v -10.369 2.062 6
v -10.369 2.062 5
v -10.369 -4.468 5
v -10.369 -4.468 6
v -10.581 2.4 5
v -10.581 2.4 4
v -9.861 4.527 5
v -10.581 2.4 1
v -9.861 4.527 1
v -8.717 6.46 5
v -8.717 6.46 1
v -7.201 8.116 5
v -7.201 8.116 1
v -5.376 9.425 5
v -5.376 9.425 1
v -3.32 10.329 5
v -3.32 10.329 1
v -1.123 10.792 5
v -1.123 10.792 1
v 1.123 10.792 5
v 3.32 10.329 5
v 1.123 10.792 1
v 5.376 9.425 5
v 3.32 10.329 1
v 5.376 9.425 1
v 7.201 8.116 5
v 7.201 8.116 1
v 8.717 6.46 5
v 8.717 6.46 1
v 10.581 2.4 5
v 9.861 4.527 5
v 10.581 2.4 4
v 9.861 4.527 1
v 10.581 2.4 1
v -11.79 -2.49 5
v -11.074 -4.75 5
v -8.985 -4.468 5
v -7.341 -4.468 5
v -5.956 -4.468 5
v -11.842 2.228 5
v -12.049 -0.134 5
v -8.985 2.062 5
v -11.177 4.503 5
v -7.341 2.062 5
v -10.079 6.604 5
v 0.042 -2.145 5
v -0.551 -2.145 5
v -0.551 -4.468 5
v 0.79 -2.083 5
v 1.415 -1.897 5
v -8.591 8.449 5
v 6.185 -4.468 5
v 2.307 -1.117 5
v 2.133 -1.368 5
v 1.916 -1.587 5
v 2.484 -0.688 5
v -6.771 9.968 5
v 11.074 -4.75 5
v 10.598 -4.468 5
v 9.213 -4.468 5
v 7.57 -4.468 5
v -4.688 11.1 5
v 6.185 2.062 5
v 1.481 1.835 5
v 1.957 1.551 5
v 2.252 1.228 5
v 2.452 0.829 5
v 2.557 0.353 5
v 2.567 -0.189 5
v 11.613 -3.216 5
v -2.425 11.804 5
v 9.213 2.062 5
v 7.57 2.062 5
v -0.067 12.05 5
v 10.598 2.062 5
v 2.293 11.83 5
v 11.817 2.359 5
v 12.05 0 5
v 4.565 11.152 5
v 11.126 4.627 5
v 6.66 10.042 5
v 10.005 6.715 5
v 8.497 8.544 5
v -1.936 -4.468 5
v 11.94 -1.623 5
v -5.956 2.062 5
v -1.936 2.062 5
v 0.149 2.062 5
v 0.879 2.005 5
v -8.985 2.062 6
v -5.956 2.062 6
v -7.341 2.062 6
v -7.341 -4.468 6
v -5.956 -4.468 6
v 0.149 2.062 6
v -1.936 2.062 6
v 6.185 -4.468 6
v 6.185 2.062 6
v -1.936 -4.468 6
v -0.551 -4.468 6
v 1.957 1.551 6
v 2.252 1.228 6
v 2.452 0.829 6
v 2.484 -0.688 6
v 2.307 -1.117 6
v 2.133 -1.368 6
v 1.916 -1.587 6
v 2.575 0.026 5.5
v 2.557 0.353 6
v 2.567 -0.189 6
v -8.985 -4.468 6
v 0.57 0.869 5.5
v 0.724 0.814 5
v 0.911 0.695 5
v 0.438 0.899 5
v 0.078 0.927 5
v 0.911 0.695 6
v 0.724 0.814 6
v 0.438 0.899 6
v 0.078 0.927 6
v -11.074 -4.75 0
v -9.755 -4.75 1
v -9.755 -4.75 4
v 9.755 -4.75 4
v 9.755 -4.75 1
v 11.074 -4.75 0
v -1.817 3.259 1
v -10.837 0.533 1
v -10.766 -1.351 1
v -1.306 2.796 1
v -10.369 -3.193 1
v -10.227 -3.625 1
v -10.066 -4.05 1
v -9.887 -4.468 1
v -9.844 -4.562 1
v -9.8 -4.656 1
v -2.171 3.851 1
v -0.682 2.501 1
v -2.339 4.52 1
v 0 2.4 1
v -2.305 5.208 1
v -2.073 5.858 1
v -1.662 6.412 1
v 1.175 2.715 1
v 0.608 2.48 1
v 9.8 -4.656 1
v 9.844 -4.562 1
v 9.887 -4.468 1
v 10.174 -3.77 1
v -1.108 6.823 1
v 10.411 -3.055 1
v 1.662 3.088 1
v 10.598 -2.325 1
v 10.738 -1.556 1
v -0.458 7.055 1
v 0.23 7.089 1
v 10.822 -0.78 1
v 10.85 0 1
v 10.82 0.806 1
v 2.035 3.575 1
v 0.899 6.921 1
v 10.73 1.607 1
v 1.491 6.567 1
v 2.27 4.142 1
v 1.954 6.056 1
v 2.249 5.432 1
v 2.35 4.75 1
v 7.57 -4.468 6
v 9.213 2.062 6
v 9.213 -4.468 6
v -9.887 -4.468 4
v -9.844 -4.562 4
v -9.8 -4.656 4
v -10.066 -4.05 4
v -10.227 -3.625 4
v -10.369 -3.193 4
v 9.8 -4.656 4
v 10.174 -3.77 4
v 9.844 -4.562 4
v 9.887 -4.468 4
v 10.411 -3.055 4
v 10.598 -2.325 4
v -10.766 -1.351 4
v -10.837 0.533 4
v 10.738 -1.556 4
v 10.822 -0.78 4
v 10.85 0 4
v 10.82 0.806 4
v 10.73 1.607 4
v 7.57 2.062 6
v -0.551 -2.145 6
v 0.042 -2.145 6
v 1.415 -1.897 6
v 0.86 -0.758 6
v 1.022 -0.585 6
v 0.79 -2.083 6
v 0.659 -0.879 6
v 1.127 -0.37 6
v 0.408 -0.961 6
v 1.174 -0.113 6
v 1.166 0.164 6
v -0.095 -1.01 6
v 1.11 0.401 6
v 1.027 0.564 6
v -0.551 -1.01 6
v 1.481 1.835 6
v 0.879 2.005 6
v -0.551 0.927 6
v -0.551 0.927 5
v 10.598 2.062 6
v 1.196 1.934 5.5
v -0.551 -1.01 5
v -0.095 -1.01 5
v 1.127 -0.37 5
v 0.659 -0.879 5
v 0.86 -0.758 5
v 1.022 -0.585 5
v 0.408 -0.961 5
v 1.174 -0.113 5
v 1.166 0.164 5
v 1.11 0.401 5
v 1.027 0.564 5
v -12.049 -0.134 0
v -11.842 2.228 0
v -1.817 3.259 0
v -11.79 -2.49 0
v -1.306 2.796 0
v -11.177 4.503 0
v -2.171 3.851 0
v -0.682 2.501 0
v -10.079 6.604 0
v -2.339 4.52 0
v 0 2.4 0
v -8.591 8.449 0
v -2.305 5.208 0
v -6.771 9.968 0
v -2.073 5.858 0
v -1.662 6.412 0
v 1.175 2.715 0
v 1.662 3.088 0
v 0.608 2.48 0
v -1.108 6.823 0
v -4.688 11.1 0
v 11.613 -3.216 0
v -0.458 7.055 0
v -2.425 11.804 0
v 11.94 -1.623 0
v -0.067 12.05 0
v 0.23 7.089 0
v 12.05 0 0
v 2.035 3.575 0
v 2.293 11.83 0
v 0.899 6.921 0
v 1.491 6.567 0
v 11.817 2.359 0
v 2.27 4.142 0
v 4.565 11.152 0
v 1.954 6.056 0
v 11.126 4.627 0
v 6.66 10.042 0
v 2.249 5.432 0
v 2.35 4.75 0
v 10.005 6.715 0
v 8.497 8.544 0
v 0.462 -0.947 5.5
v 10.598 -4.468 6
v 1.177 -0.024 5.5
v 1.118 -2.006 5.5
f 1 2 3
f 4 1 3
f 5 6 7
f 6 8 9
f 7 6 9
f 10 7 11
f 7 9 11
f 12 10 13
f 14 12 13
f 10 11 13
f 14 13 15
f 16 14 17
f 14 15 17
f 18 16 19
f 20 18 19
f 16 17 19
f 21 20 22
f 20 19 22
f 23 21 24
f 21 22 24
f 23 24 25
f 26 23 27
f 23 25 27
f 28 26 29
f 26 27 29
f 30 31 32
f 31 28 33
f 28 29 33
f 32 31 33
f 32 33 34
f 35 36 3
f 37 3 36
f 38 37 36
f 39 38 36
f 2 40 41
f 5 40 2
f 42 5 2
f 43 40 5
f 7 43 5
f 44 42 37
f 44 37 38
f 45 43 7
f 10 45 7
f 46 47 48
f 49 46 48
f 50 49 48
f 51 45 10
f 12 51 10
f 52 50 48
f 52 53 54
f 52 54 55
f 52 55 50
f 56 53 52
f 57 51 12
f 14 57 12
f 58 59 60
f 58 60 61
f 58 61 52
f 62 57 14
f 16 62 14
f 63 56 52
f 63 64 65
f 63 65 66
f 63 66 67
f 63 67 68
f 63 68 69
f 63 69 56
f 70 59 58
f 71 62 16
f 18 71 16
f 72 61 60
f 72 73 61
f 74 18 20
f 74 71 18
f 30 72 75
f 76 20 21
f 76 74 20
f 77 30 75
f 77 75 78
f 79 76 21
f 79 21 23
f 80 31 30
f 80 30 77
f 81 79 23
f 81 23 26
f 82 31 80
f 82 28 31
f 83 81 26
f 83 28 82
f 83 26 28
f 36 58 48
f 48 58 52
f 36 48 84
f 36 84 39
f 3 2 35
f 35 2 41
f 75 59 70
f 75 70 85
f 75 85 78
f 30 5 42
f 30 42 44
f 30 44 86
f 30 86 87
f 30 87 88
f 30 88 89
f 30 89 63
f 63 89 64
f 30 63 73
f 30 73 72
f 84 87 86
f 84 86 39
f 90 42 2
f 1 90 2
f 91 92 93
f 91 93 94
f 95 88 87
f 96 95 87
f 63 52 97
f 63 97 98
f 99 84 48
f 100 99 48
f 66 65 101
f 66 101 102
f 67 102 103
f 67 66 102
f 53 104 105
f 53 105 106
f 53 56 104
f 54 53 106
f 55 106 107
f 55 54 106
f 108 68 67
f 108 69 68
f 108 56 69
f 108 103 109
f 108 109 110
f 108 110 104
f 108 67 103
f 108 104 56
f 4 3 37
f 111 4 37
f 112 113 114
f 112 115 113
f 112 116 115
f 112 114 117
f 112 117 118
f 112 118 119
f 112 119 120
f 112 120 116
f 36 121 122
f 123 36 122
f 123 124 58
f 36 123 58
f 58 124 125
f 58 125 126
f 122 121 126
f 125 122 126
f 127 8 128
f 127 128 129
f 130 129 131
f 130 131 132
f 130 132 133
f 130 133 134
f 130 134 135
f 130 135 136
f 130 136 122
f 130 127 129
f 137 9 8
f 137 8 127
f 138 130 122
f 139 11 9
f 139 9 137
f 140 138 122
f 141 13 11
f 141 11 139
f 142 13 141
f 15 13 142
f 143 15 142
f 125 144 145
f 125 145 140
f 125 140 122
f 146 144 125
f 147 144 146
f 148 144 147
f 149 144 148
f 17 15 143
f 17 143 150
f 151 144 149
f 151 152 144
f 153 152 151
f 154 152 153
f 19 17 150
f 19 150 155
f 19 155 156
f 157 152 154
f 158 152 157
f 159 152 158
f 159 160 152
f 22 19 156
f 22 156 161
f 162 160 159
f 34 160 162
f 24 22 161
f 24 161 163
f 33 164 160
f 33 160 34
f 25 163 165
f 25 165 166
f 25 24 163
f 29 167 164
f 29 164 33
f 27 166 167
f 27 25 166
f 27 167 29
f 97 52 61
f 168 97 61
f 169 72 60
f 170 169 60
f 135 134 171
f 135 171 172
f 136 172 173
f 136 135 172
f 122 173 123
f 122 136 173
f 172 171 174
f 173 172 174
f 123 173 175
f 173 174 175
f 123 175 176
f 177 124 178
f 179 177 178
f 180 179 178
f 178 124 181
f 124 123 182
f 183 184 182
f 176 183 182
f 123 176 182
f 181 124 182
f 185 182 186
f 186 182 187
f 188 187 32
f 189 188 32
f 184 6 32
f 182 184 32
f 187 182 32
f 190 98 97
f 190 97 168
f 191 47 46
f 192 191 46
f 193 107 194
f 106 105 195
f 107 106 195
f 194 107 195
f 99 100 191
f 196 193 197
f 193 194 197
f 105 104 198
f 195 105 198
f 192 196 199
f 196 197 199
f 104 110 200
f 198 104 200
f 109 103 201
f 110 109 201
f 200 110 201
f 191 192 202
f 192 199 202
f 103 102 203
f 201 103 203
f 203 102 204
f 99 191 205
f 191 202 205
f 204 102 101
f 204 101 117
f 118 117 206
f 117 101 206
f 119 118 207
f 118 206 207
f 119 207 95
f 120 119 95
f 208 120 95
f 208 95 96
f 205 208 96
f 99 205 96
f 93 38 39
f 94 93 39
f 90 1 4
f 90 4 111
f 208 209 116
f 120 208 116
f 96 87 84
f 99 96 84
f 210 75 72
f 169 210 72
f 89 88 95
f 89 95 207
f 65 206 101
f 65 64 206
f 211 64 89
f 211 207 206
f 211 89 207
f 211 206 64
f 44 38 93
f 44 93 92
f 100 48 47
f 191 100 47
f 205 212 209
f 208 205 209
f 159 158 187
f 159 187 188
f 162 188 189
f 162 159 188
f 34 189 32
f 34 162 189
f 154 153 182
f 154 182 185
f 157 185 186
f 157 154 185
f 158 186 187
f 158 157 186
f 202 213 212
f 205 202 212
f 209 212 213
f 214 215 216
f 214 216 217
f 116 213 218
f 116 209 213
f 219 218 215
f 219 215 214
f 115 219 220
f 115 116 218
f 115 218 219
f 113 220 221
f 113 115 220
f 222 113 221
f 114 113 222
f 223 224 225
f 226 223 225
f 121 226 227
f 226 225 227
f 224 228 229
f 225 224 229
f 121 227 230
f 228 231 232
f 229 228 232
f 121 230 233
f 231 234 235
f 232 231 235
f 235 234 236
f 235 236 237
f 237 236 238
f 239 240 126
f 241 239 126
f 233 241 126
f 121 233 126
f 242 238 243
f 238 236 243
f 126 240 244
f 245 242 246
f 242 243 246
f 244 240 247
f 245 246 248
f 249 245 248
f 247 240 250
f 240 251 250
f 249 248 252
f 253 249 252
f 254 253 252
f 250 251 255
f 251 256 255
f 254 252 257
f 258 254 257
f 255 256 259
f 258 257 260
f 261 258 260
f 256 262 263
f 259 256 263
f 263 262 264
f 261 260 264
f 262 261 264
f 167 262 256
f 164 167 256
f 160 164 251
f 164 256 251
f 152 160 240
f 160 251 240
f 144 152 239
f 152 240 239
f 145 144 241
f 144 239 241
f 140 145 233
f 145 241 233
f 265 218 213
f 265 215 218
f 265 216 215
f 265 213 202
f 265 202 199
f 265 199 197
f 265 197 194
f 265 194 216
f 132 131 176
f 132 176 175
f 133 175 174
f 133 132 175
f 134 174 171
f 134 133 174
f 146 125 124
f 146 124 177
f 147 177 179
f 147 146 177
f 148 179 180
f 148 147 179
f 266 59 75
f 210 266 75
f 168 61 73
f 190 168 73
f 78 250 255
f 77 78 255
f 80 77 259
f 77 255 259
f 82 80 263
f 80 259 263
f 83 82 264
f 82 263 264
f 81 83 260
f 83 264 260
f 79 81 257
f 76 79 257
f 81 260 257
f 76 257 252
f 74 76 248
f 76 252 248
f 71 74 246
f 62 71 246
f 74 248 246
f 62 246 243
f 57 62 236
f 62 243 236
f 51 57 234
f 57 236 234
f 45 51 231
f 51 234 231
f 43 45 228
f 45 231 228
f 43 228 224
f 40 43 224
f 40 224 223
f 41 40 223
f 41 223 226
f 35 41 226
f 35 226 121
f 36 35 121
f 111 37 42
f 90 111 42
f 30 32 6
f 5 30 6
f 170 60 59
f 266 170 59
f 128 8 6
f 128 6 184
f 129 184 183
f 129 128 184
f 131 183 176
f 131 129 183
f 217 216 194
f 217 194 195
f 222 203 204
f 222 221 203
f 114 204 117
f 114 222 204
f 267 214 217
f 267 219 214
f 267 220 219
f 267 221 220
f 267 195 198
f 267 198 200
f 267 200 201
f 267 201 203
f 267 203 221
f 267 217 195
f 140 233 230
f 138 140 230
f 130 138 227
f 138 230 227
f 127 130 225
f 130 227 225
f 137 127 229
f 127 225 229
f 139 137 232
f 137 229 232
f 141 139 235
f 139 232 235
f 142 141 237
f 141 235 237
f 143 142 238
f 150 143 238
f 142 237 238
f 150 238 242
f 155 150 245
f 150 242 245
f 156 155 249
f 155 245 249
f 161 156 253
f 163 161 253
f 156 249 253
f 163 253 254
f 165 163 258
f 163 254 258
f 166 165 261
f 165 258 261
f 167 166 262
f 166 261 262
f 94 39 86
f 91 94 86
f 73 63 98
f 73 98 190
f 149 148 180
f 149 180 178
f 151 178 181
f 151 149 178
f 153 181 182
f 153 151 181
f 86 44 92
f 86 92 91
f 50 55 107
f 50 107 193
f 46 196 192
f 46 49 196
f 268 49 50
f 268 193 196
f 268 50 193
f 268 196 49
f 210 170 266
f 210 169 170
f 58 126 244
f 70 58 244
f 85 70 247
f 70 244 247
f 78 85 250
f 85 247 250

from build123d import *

# Parameters (mm, degrees)
F0_W     = 1.3848739799
F0_H     = 6.5299166297
F1_DEPTH = 5
F2_DEPTH = 6
F3_DEPTH = 4
F4_DEPTH = 1


# Not quite as in the source:
# - a feature names something its author has since deleted; it is built from what else it names


with BuildPart() as f1:
    # F0 (on Top) → F1 (new body)
    with BuildSketch(Plane.XY):
        with BuildLine():
            ThreePointArc((-9.8874952566, -4.4676545918), (-9.8222615585, -4.6093034047), (-9.7549987186, -4.75))
            Line((-9.7549987186, -4.75), (9.7549987186, -4.75))
            ThreePointArc((9.7549987186, -4.75), (9.8222615585, -4.6093034047), (9.8874952566, -4.4676545918))
            Line((9.8874952566, -4.4676545918), (9.2131992894, -4.4676545918))
            Line((9.2131992894, -4.4676545918), (9.2131992894, 2.062262038))
            Line((9.2131992894, 2.062262038), (10.5980732693, 2.062262038))
            Line((10.5980732693, 2.062262038), (10.5980732693, -2.3245091907))
            ThreePointArc((10.5980732693, -2.3245091907), (10.7868344516, -1.1690605262), (10.85, 0))
            ThreePointArc((10.85, 0), (10.7825989969, 1.2075010861), (10.5812333875, 2.4))
            Line((10.5812333875, 2.4), (0, 2.4))
            Line((0, 2.4), (-10.5812333875, 2.4))
            ThreePointArc((-10.5812333875, 2.4), (-10.8422277422, -0.4106063639), (-10.3694047071, -3.1934223053))
            Line((-10.3694047071, -3.1934223053), (-10.3694047071, 2.062262038))
            Line((-10.3694047071, 2.062262038), (-8.9845307272, 2.062262038))
            Line((-8.9845307272, 2.062262038), (-8.9845307272, -4.4676545918))
            Line((-8.9845307272, -4.4676545918), (-9.8874952566, -4.4676545918))
        make_face()
        with Locations((-6.6485384464, -1.2026962769)):
            Rectangle(F0_W, F0_H, mode=Mode.SUBTRACT)
        with BuildLine():
            add(Edge.make_bspline(
                [(1.9565453854, 1.55061613), (2.5746650927, 1.0389702221), (2.5746650927, 0.0256826557)],
                knots=[0, 0, 0, 1, 1, 1], degree=2))
            add(Edge.make_bspline(
                [(2.5746650927, 0.0256826557), (2.5746650927, -1.0290510875), (1.9158137978, -1.5871452971)],
                knots=[0, 0, 0, 1, 1, 1], degree=2))
            add(Edge.make_bspline(
                [(1.9158137978, -1.5871452971), (1.2569625029, -2.1452395068), (0.0421607662, -2.1452395068)],
                knots=[0, 0, 0, 1, 1, 1], degree=2))
            Line((0.0421607662, -2.1452395068), (-0.5509483171, -2.1452395068))
            Line((-0.5509483171, -2.1452395068), (-0.5509483171, -4.4676545918))
            Line((-0.5509483171, -4.4676545918), (-1.935822297, -4.4676545918))
            Line((-1.935822297, -4.4676545918), (-1.935822297, 2.062262038))
            Line((-1.935822297, 2.062262038), (0.1493491547, 2.062262038))
            add(Edge.make_bspline(
                [(0.1493491547, 2.062262038), (1.3384256782, 2.062262038), (1.9565453854, 1.55061613)],
                knots=[0, 0, 0, 1, 1, 1], degree=2))
        make_face(mode=Mode.SUBTRACT)
        with Locations((6.8772070086, -1.2026962769)):
            Rectangle(F0_W, F0_H, mode=Mode.SUBTRACT)
        with BuildLine():
            ThreePointArc((11.0742945599, -4.75), (11.8035534787, -2.4245876508), (12.05, 0))
            ThreePointArc((12.05, 0), (-2.4245876508, 11.8035534787), (-11.0742945599, -4.75))
            Line((-11.0742945599, -4.75), (-9.7549987186, -4.75))
            ThreePointArc((-9.7549987186, -4.75), (-9.8222615585, -4.6093034047), (-9.8874952566, -4.4676545918))
            Line((-9.8874952566, -4.4676545918), (-10.3694047071, -4.4676545918))
            Line((-10.3694047071, -4.4676545918), (-10.3694047071, -3.1934223053))
            ThreePointArc((-10.3694047071, -3.1934223053), (-10.8422277422, -0.4106063639), (-10.5812333875, 2.4))
            ThreePointArc((-10.5812333875, 2.4), (0, 10.85), (10.5812333875, 2.4))
            ThreePointArc((10.5812333875, 2.4), (10.7825989969, 1.2075010861), (10.85, 0))
            ThreePointArc((10.85, 0), (10.7868344516, -1.1690605262), (10.5980732693, -2.3245091907))
            Line((10.5980732693, -2.3245091907), (10.5980732693, -4.4676545918))
            Line((10.5980732693, -4.4676545918), (9.8874952566, -4.4676545918))
            ThreePointArc((9.8874952566, -4.4676545918), (9.8222615585, -4.6093034047), (9.7549987186, -4.75))
            Line((9.7549987186, -4.75), (11.0742945599, -4.75))
        make_face()
        with BuildLine():
            Line((-0.5509483171, 0.927494298), (-0.5509483171, -1.0104717668))
            Line((-0.5509483171, -1.0104717668), (-0.0950403712, -1.0104717668))
            add(Edge.make_bspline(
                [(-0.0950403712, -1.0104717668), (0.542373246, -1.0104717668), (0.8596508761, -0.7582217591)],
                knots=[0, 0, 0, 1, 1, 1], degree=2))
            add(Edge.make_bspline(
                [(0.8596508761, -0.7582217591), (1.1769285061, -0.5059717514), (1.1769285061, -0.0243385922)],
                knots=[0, 0, 0, 1, 1, 1], degree=2))
            add(Edge.make_bspline(
                [(1.1769285061, -0.0243385922), (1.1769285061, 0.463011281), (0.9111013026, 0.6952527895)],
                knots=[0, 0, 0, 1, 1, 1], degree=2))
            add(Edge.make_bspline(
                [(0.9111013026, 0.6952527895), (0.645274099, 0.927494298), (0.077890229, 0.927494298)],
                knots=[0, 0, 0, 1, 1, 1], degree=2))
            Line((0.077890229, 0.927494298), (-0.5509483171, 0.927494298))
        make_face()
    extrude(amount=F1_DEPTH)

    # F0 (on Top) → F2 (join)
    with BuildSketch(Plane.XY):
        with BuildLine():
            ThreePointArc((-10.3694047071, -3.1934223053), (-10.1484686537, -3.8381094285), (-9.8874952566, -4.4676545918))
            Line((-9.8874952566, -4.4676545918), (-8.9845307272, -4.4676545918))
            Line((-8.9845307272, -4.4676545918), (-8.9845307272, 2.062262038))
            Line((-8.9845307272, 2.062262038), (-10.3694047071, 2.062262038))
            Line((-10.3694047071, 2.062262038), (-10.3694047071, -3.1934223053))
        make_face()
        with BuildLine():
            Line((-10.3694047071, -4.4676545918), (-9.8874952566, -4.4676545918))
            ThreePointArc((-9.8874952566, -4.4676545918), (-10.1484686537, -3.8381094285), (-10.3694047071, -3.1934223053))
            Line((-10.3694047071, -3.1934223053), (-10.3694047071, -4.4676545918))
        make_face()
        with Locations((-6.6485384464, -1.2026962769)):
            Rectangle(F0_W, F0_H)
        with BuildLine():
            add(Edge.make_bspline(
                [(2.5746650927, 0.0256826557), (2.5746650927, -1.0290510875), (1.9158137978, -1.5871452971)],
                knots=[0, 0, 0, 1, 1, 1], degree=2))
            add(Edge.make_bspline(
                [(1.9565453854, 1.55061613), (2.5746650927, 1.0389702221), (2.5746650927, 0.0256826557)],
                knots=[0, 0, 0, 1, 1, 1], degree=2))
            add(Edge.make_bspline(
                [(0.1493491547, 2.062262038), (1.3384256782, 2.062262038), (1.9565453854, 1.55061613)],
                knots=[0, 0, 0, 1, 1, 1], degree=2))
            Line((0.1493491547, 2.062262038), (-1.935822297, 2.062262038))
            Line((-1.935822297, 2.062262038), (-1.935822297, -4.4676545918))
            Line((-1.935822297, -4.4676545918), (-0.5509483171, -4.4676545918))
            Line((-0.5509483171, -4.4676545918), (-0.5509483171, -2.1452395068))
            Line((-0.5509483171, -2.1452395068), (0.0421607662, -2.1452395068))
            add(Edge.make_bspline(
                [(1.9158137978, -1.5871452971), (1.2569625029, -2.1452395068), (0.0421607662, -2.1452395068)],
                knots=[0, 0, 0, 1, 1, 1], degree=2))
        make_face()
        with BuildLine():
            Line((-0.0950403712, -1.0104717668), (-0.5509483171, -1.0104717668))
            Line((-0.5509483171, -1.0104717668), (-0.5509483171, 0.927494298))
            Line((-0.5509483171, 0.927494298), (0.077890229, 0.927494298))
            add(Edge.make_bspline(
                [(0.9111013026, 0.6952527895), (0.645274099, 0.927494298), (0.077890229, 0.927494298)],
                knots=[0, 0, 0, 1, 1, 1], degree=2))
            add(Edge.make_bspline(
                [(1.1769285061, -0.0243385922), (1.1769285061, 0.463011281), (0.9111013026, 0.6952527895)],
                knots=[0, 0, 0, 1, 1, 1], degree=2))
            add(Edge.make_bspline(
                [(0.8596508761, -0.7582217591), (1.1769285061, -0.5059717514), (1.1769285061, -0.0243385922)],
                knots=[0, 0, 0, 1, 1, 1], degree=2))
            add(Edge.make_bspline(
                [(-0.0950403712, -1.0104717668), (0.542373246, -1.0104717668), (0.8596508761, -0.7582217591)],
                knots=[0, 0, 0, 1, 1, 1], degree=2))
        make_face(mode=Mode.SUBTRACT)
        with Locations((6.8772070086, -1.2026962769)):
            Rectangle(F0_W, F0_H)
        with BuildLine():
            Line((9.2131992894, -4.4676545918), (9.8874952566, -4.4676545918))
            ThreePointArc((9.8874952566, -4.4676545918), (10.2986842611, -3.4146160092), (10.5980732693, -2.3245091907))
            Line((10.5980732693, -2.3245091907), (10.5980732693, 2.062262038))
            Line((10.5980732693, 2.062262038), (9.2131992894, 2.062262038))
            Line((9.2131992894, 2.062262038), (9.2131992894, -4.4676545918))
        make_face()
        with BuildLine():
            ThreePointArc((10.5980732693, -2.3245091907), (10.2986842611, -3.4146160092), (9.8874952566, -4.4676545918))
            Line((9.8874952566, -4.4676545918), (10.5980732693, -4.4676545918))
            Line((10.5980732693, -4.4676545918), (10.5980732693, -2.3245091907))
        make_face()
    extrude(amount=F2_DEPTH)

    # F0 (on Top) → F3 (cut)
    with BuildSketch(Plane.XY):
        with BuildLine():
            ThreePointArc((-9.8874952566, -4.4676545918), (-9.8222615585, -4.6093034047), (-9.7549987186, -4.75))
            Line((-9.7549987186, -4.75), (9.7549987186, -4.75))
            ThreePointArc((9.7549987186, -4.75), (9.8222615585, -4.6093034047), (9.8874952566, -4.4676545918))
            Line((9.8874952566, -4.4676545918), (9.2131992894, -4.4676545918))
            Line((9.2131992894, -4.4676545918), (9.2131992894, 2.062262038))
            Line((9.2131992894, 2.062262038), (10.5980732693, 2.062262038))
            Line((10.5980732693, 2.062262038), (10.5980732693, -2.3245091907))
            ThreePointArc((10.5980732693, -2.3245091907), (10.7868344516, -1.1690605262), (10.85, 0))
            ThreePointArc((10.85, 0), (10.7825989969, 1.2075010861), (10.5812333875, 2.4))
            Line((10.5812333875, 2.4), (0, 2.4))
            Line((0, 2.4), (-10.5812333875, 2.4))
            ThreePointArc((-10.5812333875, 2.4), (-10.8422277422, -0.4106063639), (-10.3694047071, -3.1934223053))
            Line((-10.3694047071, -3.1934223053), (-10.3694047071, 2.062262038))
            Line((-10.3694047071, 2.062262038), (-8.9845307272, 2.062262038))
            Line((-8.9845307272, 2.062262038), (-8.9845307272, -4.4676545918))
            Line((-8.9845307272, -4.4676545918), (-9.8874952566, -4.4676545918))
        make_face()
        with Locations((-6.6485384464, -1.2026962769)):
            Rectangle(F0_W, F0_H, mode=Mode.SUBTRACT)
        with BuildLine():
            add(Edge.make_bspline(
                [(1.9565453854, 1.55061613), (2.5746650927, 1.0389702221), (2.5746650927, 0.0256826557)],
                knots=[0, 0, 0, 1, 1, 1], degree=2))
            add(Edge.make_bspline(
                [(2.5746650927, 0.0256826557), (2.5746650927, -1.0290510875), (1.9158137978, -1.5871452971)],
                knots=[0, 0, 0, 1, 1, 1], degree=2))
            add(Edge.make_bspline(
                [(1.9158137978, -1.5871452971), (1.2569625029, -2.1452395068), (0.0421607662, -2.1452395068)],
                knots=[0, 0, 0, 1, 1, 1], degree=2))
            Line((0.0421607662, -2.1452395068), (-0.5509483171, -2.1452395068))
            Line((-0.5509483171, -2.1452395068), (-0.5509483171, -4.4676545918))
            Line((-0.5509483171, -4.4676545918), (-1.935822297, -4.4676545918))
            Line((-1.935822297, -4.4676545918), (-1.935822297, 2.062262038))
            Line((-1.935822297, 2.062262038), (0.1493491547, 2.062262038))
            add(Edge.make_bspline(
                [(0.1493491547, 2.062262038), (1.3384256782, 2.062262038), (1.9565453854, 1.55061613)],
                knots=[0, 0, 0, 1, 1, 1], degree=2))
        make_face(mode=Mode.SUBTRACT)
        with Locations((6.8772070086, -1.2026962769)):
            Rectangle(F0_W, F0_H, mode=Mode.SUBTRACT)
        with BuildLine():
            ThreePointArc((-10.3694047071, -3.1934223053), (-10.1484686537, -3.8381094285), (-9.8874952566, -4.4676545918))
            Line((-9.8874952566, -4.4676545918), (-8.9845307272, -4.4676545918))
            Line((-8.9845307272, -4.4676545918), (-8.9845307272, 2.062262038))
            Line((-8.9845307272, 2.062262038), (-10.3694047071, 2.062262038))
            Line((-10.3694047071, 2.062262038), (-10.3694047071, -3.1934223053))
        make_face()
        with Locations((-6.6485384464, -1.2026962769)):
            Rectangle(F0_W, F0_H)
        with BuildLine():
            add(Edge.make_bspline(
                [(2.5746650927, 0.0256826557), (2.5746650927, -1.0290510875), (1.9158137978, -1.5871452971)],
                knots=[0, 0, 0, 1, 1, 1], degree=2))
            add(Edge.make_bspline(
                [(1.9565453854, 1.55061613), (2.5746650927, 1.0389702221), (2.5746650927, 0.0256826557)],
                knots=[0, 0, 0, 1, 1, 1], degree=2))
            add(Edge.make_bspline(
                [(0.1493491547, 2.062262038), (1.3384256782, 2.062262038), (1.9565453854, 1.55061613)],
                knots=[0, 0, 0, 1, 1, 1], degree=2))
            Line((0.1493491547, 2.062262038), (-1.935822297, 2.062262038))
            Line((-1.935822297, 2.062262038), (-1.935822297, -4.4676545918))
            Line((-1.935822297, -4.4676545918), (-0.5509483171, -4.4676545918))
            Line((-0.5509483171, -4.4676545918), (-0.5509483171, -2.1452395068))
            Line((-0.5509483171, -2.1452395068), (0.0421607662, -2.1452395068))
            add(Edge.make_bspline(
                [(1.9158137978, -1.5871452971), (1.2569625029, -2.1452395068), (0.0421607662, -2.1452395068)],
                knots=[0, 0, 0, 1, 1, 1], degree=2))
        make_face()
        with BuildLine():
            Line((-0.0950403712, -1.0104717668), (-0.5509483171, -1.0104717668))
            Line((-0.5509483171, -1.0104717668), (-0.5509483171, 0.927494298))
            Line((-0.5509483171, 0.927494298), (0.077890229, 0.927494298))
            add(Edge.make_bspline(
                [(0.9111013026, 0.6952527895), (0.645274099, 0.927494298), (0.077890229, 0.927494298)],
                knots=[0, 0, 0, 1, 1, 1], degree=2))
            add(Edge.make_bspline(
                [(1.1769285061, -0.0243385922), (1.1769285061, 0.463011281), (0.9111013026, 0.6952527895)],
                knots=[0, 0, 0, 1, 1, 1], degree=2))
            add(Edge.make_bspline(
                [(0.8596508761, -0.7582217591), (1.1769285061, -0.5059717514), (1.1769285061, -0.0243385922)],
                knots=[0, 0, 0, 1, 1, 1], degree=2))
            add(Edge.make_bspline(
                [(-0.0950403712, -1.0104717668), (0.542373246, -1.0104717668), (0.8596508761, -0.7582217591)],
                knots=[0, 0, 0, 1, 1, 1], degree=2))
        make_face(mode=Mode.SUBTRACT)
        with BuildLine():
            Line((-0.5509483171, 0.927494298), (-0.5509483171, -1.0104717668))
            Line((-0.5509483171, -1.0104717668), (-0.0950403712, -1.0104717668))
            add(Edge.make_bspline(
                [(-0.0950403712, -1.0104717668), (0.542373246, -1.0104717668), (0.8596508761, -0.7582217591)],
                knots=[0, 0, 0, 1, 1, 1], degree=2))
            add(Edge.make_bspline(
                [(0.8596508761, -0.7582217591), (1.1769285061, -0.5059717514), (1.1769285061, -0.0243385922)],
                knots=[0, 0, 0, 1, 1, 1], degree=2))
            add(Edge.make_bspline(
                [(1.1769285061, -0.0243385922), (1.1769285061, 0.463011281), (0.9111013026, 0.6952527895)],
                knots=[0, 0, 0, 1, 1, 1], degree=2))
            add(Edge.make_bspline(
                [(0.9111013026, 0.6952527895), (0.645274099, 0.927494298), (0.077890229, 0.927494298)],
                knots=[0, 0, 0, 1, 1, 1], degree=2))
            Line((0.077890229, 0.927494298), (-0.5509483171, 0.927494298))
        make_face()
        with Locations((6.8772070086, -1.2026962769)):
            Rectangle(F0_W, F0_H)
        with BuildLine():
            Line((9.2131992894, -4.4676545918), (9.8874952566, -4.4676545918))
            ThreePointArc((9.8874952566, -4.4676545918), (10.2986842611, -3.4146160092), (10.5980732693, -2.3245091907))
            Line((10.5980732693, -2.3245091907), (10.5980732693, 2.062262038))
            Line((10.5980732693, 2.062262038), (9.2131992894, 2.062262038))
            Line((9.2131992894, 2.062262038), (9.2131992894, -4.4676545918))
        make_face()
    extrude(amount=F3_DEPTH, mode=Mode.SUBTRACT)

    # F0 (on Top) → F4 (join)
    with BuildSketch(Plane.XY):
        with BuildLine():
            ThreePointArc((10.5812333875, 2.4), (0, 10.85), (-10.5812333875, 2.4))
            Line((-10.5812333875, 2.4), (0, 2.4))
            Line((0, 2.4), (10.5812333875, 2.4))
        make_face()
        with BuildLine():
            ThreePointArc((2.35, 4.75), (1.6617009358, 3.0882990642), (0, 2.4))
            ThreePointArc((0, 2.4), (-1.6617009358, 6.4117009358), (2.35, 4.75))
        make_face(mode=Mode.SUBTRACT)
        with BuildLine():
            ThreePointArc((-9.8874952566, -4.4676545918), (-9.8222615585, -4.6093034047), (-9.7549987186, -4.75))
            Line((-9.7549987186, -4.75), (9.7549987186, -4.75))
            ThreePointArc((9.7549987186, -4.75), (9.8222615585, -4.6093034047), (9.8874952566, -4.4676545918))
            Line((9.8874952566, -4.4676545918), (9.2131992894, -4.4676545918))
            Line((9.2131992894, -4.4676545918), (9.2131992894, 2.062262038))
            Line((9.2131992894, 2.062262038), (10.5980732693, 2.062262038))
            Line((10.5980732693, 2.062262038), (10.5980732693, -2.3245091907))
            ThreePointArc((10.5980732693, -2.3245091907), (10.7868344516, -1.1690605262), (10.85, 0))
            ThreePointArc((10.85, 0), (10.7825989969, 1.2075010861), (10.5812333875, 2.4))
            Line((10.5812333875, 2.4), (0, 2.4))
            Line((0, 2.4), (-10.5812333875, 2.4))
            ThreePointArc((-10.5812333875, 2.4), (-10.8422277422, -0.4106063639), (-10.3694047071, -3.1934223053))
            Line((-10.3694047071, -3.1934223053), (-10.3694047071, 2.062262038))
            Line((-10.3694047071, 2.062262038), (-8.9845307272, 2.062262038))
            Line((-8.9845307272, 2.062262038), (-8.9845307272, -4.4676545918))
            Line((-8.9845307272, -4.4676545918), (-9.8874952566, -4.4676545918))
        make_face()
        with Locations((-6.6485384464, -1.2026962769)):
            Rectangle(F0_W, F0_H, mode=Mode.SUBTRACT)
        with BuildLine():
            add(Edge.make_bspline(
                [(1.9565453854, 1.55061613), (2.5746650927, 1.0389702221), (2.5746650927, 0.0256826557)],
                knots=[0, 0, 0, 1, 1, 1], degree=2))
            add(Edge.make_bspline(
                [(2.5746650927, 0.0256826557), (2.5746650927, -1.0290510875), (1.9158137978, -1.5871452971)],
                knots=[0, 0, 0, 1, 1, 1], degree=2))
            add(Edge.make_bspline(
                [(1.9158137978, -1.5871452971), (1.2569625029, -2.1452395068), (0.0421607662, -2.1452395068)],
                knots=[0, 0, 0, 1, 1, 1], degree=2))
            Line((0.0421607662, -2.1452395068), (-0.5509483171, -2.1452395068))
            Line((-0.5509483171, -2.1452395068), (-0.5509483171, -4.4676545918))
            Line((-0.5509483171, -4.4676545918), (-1.935822297, -4.4676545918))
            Line((-1.935822297, -4.4676545918), (-1.935822297, 2.062262038))
            Line((-1.935822297, 2.062262038), (0.1493491547, 2.062262038))
            add(Edge.make_bspline(
                [(0.1493491547, 2.062262038), (1.3384256782, 2.062262038), (1.9565453854, 1.55061613)],
                knots=[0, 0, 0, 1, 1, 1], degree=2))
        make_face(mode=Mode.SUBTRACT)
        with Locations((6.8772070086, -1.2026962769)):
            Rectangle(F0_W, F0_H, mode=Mode.SUBTRACT)
        with BuildLine():
            ThreePointArc((-10.3694047071, -3.1934223053), (-10.1484686537, -3.8381094285), (-9.8874952566, -4.4676545918))
            Line((-9.8874952566, -4.4676545918), (-8.9845307272, -4.4676545918))
            Line((-8.9845307272, -4.4676545918), (-8.9845307272, 2.062262038))
            Line((-8.9845307272, 2.062262038), (-10.3694047071, 2.062262038))
            Line((-10.3694047071, 2.062262038), (-10.3694047071, -3.1934223053))
        make_face()
        with Locations((-6.6485384464, -1.2026962769)):
            Rectangle(F0_W, F0_H)
        with BuildLine():
            add(Edge.make_bspline(
                [(2.5746650927, 0.0256826557), (2.5746650927, -1.0290510875), (1.9158137978, -1.5871452971)],
                knots=[0, 0, 0, 1, 1, 1], degree=2))
            add(Edge.make_bspline(
                [(1.9565453854, 1.55061613), (2.5746650927, 1.0389702221), (2.5746650927, 0.0256826557)],
                knots=[0, 0, 0, 1, 1, 1], degree=2))
            add(Edge.make_bspline(
                [(0.1493491547, 2.062262038), (1.3384256782, 2.062262038), (1.9565453854, 1.55061613)],
                knots=[0, 0, 0, 1, 1, 1], degree=2))
            Line((0.1493491547, 2.062262038), (-1.935822297, 2.062262038))
            Line((-1.935822297, 2.062262038), (-1.935822297, -4.4676545918))
            Line((-1.935822297, -4.4676545918), (-0.5509483171, -4.4676545918))
            Line((-0.5509483171, -4.4676545918), (-0.5509483171, -2.1452395068))
            Line((-0.5509483171, -2.1452395068), (0.0421607662, -2.1452395068))
            add(Edge.make_bspline(
                [(1.9158137978, -1.5871452971), (1.2569625029, -2.1452395068), (0.0421607662, -2.1452395068)],
                knots=[0, 0, 0, 1, 1, 1], degree=2))
        make_face()
        with BuildLine():
            Line((-0.0950403712, -1.0104717668), (-0.5509483171, -1.0104717668))
            Line((-0.5509483171, -1.0104717668), (-0.5509483171, 0.927494298))
            Line((-0.5509483171, 0.927494298), (0.077890229, 0.927494298))
            add(Edge.make_bspline(
                [(0.9111013026, 0.6952527895), (0.645274099, 0.927494298), (0.077890229, 0.927494298)],
                knots=[0, 0, 0, 1, 1, 1], degree=2))
            add(Edge.make_bspline(
                [(1.1769285061, -0.0243385922), (1.1769285061, 0.463011281), (0.9111013026, 0.6952527895)],
                knots=[0, 0, 0, 1, 1, 1], degree=2))
            add(Edge.make_bspline(
                [(0.8596508761, -0.7582217591), (1.1769285061, -0.5059717514), (1.1769285061, -0.0243385922)],
                knots=[0, 0, 0, 1, 1, 1], degree=2))
            add(Edge.make_bspline(
                [(-0.0950403712, -1.0104717668), (0.542373246, -1.0104717668), (0.8596508761, -0.7582217591)],
                knots=[0, 0, 0, 1, 1, 1], degree=2))
        make_face(mode=Mode.SUBTRACT)
        with BuildLine():
            Line((-0.5509483171, 0.927494298), (-0.5509483171, -1.0104717668))
            Line((-0.5509483171, -1.0104717668), (-0.0950403712, -1.0104717668))
            add(Edge.make_bspline(
                [(-0.0950403712, -1.0104717668), (0.542373246, -1.0104717668), (0.8596508761, -0.7582217591)],
                knots=[0, 0, 0, 1, 1, 1], degree=2))
            add(Edge.make_bspline(
                [(0.8596508761, -0.7582217591), (1.1769285061, -0.5059717514), (1.1769285061, -0.0243385922)],
                knots=[0, 0, 0, 1, 1, 1], degree=2))
            add(Edge.make_bspline(
                [(1.1769285061, -0.0243385922), (1.1769285061, 0.463011281), (0.9111013026, 0.6952527895)],
                knots=[0, 0, 0, 1, 1, 1], degree=2))
            add(Edge.make_bspline(
                [(0.9111013026, 0.6952527895), (0.645274099, 0.927494298), (0.077890229, 0.927494298)],
                knots=[0, 0, 0, 1, 1, 1], degree=2))
            Line((0.077890229, 0.927494298), (-0.5509483171, 0.927494298))
        make_face()
        with Locations((6.8772070086, -1.2026962769)):
            Rectangle(F0_W, F0_H)
        with BuildLine():
            Line((9.2131992894, -4.4676545918), (9.8874952566, -4.4676545918))
            ThreePointArc((9.8874952566, -4.4676545918), (10.2986842611, -3.4146160092), (10.5980732693, -2.3245091907))
            Line((10.5980732693, -2.3245091907), (10.5980732693, 2.062262038))
            Line((10.5980732693, 2.062262038), (9.2131992894, 2.062262038))
            Line((9.2131992894, 2.062262038), (9.2131992894, -4.4676545918))
        make_face()
    extrude(amount=F4_DEPTH)


solid = f1.part
